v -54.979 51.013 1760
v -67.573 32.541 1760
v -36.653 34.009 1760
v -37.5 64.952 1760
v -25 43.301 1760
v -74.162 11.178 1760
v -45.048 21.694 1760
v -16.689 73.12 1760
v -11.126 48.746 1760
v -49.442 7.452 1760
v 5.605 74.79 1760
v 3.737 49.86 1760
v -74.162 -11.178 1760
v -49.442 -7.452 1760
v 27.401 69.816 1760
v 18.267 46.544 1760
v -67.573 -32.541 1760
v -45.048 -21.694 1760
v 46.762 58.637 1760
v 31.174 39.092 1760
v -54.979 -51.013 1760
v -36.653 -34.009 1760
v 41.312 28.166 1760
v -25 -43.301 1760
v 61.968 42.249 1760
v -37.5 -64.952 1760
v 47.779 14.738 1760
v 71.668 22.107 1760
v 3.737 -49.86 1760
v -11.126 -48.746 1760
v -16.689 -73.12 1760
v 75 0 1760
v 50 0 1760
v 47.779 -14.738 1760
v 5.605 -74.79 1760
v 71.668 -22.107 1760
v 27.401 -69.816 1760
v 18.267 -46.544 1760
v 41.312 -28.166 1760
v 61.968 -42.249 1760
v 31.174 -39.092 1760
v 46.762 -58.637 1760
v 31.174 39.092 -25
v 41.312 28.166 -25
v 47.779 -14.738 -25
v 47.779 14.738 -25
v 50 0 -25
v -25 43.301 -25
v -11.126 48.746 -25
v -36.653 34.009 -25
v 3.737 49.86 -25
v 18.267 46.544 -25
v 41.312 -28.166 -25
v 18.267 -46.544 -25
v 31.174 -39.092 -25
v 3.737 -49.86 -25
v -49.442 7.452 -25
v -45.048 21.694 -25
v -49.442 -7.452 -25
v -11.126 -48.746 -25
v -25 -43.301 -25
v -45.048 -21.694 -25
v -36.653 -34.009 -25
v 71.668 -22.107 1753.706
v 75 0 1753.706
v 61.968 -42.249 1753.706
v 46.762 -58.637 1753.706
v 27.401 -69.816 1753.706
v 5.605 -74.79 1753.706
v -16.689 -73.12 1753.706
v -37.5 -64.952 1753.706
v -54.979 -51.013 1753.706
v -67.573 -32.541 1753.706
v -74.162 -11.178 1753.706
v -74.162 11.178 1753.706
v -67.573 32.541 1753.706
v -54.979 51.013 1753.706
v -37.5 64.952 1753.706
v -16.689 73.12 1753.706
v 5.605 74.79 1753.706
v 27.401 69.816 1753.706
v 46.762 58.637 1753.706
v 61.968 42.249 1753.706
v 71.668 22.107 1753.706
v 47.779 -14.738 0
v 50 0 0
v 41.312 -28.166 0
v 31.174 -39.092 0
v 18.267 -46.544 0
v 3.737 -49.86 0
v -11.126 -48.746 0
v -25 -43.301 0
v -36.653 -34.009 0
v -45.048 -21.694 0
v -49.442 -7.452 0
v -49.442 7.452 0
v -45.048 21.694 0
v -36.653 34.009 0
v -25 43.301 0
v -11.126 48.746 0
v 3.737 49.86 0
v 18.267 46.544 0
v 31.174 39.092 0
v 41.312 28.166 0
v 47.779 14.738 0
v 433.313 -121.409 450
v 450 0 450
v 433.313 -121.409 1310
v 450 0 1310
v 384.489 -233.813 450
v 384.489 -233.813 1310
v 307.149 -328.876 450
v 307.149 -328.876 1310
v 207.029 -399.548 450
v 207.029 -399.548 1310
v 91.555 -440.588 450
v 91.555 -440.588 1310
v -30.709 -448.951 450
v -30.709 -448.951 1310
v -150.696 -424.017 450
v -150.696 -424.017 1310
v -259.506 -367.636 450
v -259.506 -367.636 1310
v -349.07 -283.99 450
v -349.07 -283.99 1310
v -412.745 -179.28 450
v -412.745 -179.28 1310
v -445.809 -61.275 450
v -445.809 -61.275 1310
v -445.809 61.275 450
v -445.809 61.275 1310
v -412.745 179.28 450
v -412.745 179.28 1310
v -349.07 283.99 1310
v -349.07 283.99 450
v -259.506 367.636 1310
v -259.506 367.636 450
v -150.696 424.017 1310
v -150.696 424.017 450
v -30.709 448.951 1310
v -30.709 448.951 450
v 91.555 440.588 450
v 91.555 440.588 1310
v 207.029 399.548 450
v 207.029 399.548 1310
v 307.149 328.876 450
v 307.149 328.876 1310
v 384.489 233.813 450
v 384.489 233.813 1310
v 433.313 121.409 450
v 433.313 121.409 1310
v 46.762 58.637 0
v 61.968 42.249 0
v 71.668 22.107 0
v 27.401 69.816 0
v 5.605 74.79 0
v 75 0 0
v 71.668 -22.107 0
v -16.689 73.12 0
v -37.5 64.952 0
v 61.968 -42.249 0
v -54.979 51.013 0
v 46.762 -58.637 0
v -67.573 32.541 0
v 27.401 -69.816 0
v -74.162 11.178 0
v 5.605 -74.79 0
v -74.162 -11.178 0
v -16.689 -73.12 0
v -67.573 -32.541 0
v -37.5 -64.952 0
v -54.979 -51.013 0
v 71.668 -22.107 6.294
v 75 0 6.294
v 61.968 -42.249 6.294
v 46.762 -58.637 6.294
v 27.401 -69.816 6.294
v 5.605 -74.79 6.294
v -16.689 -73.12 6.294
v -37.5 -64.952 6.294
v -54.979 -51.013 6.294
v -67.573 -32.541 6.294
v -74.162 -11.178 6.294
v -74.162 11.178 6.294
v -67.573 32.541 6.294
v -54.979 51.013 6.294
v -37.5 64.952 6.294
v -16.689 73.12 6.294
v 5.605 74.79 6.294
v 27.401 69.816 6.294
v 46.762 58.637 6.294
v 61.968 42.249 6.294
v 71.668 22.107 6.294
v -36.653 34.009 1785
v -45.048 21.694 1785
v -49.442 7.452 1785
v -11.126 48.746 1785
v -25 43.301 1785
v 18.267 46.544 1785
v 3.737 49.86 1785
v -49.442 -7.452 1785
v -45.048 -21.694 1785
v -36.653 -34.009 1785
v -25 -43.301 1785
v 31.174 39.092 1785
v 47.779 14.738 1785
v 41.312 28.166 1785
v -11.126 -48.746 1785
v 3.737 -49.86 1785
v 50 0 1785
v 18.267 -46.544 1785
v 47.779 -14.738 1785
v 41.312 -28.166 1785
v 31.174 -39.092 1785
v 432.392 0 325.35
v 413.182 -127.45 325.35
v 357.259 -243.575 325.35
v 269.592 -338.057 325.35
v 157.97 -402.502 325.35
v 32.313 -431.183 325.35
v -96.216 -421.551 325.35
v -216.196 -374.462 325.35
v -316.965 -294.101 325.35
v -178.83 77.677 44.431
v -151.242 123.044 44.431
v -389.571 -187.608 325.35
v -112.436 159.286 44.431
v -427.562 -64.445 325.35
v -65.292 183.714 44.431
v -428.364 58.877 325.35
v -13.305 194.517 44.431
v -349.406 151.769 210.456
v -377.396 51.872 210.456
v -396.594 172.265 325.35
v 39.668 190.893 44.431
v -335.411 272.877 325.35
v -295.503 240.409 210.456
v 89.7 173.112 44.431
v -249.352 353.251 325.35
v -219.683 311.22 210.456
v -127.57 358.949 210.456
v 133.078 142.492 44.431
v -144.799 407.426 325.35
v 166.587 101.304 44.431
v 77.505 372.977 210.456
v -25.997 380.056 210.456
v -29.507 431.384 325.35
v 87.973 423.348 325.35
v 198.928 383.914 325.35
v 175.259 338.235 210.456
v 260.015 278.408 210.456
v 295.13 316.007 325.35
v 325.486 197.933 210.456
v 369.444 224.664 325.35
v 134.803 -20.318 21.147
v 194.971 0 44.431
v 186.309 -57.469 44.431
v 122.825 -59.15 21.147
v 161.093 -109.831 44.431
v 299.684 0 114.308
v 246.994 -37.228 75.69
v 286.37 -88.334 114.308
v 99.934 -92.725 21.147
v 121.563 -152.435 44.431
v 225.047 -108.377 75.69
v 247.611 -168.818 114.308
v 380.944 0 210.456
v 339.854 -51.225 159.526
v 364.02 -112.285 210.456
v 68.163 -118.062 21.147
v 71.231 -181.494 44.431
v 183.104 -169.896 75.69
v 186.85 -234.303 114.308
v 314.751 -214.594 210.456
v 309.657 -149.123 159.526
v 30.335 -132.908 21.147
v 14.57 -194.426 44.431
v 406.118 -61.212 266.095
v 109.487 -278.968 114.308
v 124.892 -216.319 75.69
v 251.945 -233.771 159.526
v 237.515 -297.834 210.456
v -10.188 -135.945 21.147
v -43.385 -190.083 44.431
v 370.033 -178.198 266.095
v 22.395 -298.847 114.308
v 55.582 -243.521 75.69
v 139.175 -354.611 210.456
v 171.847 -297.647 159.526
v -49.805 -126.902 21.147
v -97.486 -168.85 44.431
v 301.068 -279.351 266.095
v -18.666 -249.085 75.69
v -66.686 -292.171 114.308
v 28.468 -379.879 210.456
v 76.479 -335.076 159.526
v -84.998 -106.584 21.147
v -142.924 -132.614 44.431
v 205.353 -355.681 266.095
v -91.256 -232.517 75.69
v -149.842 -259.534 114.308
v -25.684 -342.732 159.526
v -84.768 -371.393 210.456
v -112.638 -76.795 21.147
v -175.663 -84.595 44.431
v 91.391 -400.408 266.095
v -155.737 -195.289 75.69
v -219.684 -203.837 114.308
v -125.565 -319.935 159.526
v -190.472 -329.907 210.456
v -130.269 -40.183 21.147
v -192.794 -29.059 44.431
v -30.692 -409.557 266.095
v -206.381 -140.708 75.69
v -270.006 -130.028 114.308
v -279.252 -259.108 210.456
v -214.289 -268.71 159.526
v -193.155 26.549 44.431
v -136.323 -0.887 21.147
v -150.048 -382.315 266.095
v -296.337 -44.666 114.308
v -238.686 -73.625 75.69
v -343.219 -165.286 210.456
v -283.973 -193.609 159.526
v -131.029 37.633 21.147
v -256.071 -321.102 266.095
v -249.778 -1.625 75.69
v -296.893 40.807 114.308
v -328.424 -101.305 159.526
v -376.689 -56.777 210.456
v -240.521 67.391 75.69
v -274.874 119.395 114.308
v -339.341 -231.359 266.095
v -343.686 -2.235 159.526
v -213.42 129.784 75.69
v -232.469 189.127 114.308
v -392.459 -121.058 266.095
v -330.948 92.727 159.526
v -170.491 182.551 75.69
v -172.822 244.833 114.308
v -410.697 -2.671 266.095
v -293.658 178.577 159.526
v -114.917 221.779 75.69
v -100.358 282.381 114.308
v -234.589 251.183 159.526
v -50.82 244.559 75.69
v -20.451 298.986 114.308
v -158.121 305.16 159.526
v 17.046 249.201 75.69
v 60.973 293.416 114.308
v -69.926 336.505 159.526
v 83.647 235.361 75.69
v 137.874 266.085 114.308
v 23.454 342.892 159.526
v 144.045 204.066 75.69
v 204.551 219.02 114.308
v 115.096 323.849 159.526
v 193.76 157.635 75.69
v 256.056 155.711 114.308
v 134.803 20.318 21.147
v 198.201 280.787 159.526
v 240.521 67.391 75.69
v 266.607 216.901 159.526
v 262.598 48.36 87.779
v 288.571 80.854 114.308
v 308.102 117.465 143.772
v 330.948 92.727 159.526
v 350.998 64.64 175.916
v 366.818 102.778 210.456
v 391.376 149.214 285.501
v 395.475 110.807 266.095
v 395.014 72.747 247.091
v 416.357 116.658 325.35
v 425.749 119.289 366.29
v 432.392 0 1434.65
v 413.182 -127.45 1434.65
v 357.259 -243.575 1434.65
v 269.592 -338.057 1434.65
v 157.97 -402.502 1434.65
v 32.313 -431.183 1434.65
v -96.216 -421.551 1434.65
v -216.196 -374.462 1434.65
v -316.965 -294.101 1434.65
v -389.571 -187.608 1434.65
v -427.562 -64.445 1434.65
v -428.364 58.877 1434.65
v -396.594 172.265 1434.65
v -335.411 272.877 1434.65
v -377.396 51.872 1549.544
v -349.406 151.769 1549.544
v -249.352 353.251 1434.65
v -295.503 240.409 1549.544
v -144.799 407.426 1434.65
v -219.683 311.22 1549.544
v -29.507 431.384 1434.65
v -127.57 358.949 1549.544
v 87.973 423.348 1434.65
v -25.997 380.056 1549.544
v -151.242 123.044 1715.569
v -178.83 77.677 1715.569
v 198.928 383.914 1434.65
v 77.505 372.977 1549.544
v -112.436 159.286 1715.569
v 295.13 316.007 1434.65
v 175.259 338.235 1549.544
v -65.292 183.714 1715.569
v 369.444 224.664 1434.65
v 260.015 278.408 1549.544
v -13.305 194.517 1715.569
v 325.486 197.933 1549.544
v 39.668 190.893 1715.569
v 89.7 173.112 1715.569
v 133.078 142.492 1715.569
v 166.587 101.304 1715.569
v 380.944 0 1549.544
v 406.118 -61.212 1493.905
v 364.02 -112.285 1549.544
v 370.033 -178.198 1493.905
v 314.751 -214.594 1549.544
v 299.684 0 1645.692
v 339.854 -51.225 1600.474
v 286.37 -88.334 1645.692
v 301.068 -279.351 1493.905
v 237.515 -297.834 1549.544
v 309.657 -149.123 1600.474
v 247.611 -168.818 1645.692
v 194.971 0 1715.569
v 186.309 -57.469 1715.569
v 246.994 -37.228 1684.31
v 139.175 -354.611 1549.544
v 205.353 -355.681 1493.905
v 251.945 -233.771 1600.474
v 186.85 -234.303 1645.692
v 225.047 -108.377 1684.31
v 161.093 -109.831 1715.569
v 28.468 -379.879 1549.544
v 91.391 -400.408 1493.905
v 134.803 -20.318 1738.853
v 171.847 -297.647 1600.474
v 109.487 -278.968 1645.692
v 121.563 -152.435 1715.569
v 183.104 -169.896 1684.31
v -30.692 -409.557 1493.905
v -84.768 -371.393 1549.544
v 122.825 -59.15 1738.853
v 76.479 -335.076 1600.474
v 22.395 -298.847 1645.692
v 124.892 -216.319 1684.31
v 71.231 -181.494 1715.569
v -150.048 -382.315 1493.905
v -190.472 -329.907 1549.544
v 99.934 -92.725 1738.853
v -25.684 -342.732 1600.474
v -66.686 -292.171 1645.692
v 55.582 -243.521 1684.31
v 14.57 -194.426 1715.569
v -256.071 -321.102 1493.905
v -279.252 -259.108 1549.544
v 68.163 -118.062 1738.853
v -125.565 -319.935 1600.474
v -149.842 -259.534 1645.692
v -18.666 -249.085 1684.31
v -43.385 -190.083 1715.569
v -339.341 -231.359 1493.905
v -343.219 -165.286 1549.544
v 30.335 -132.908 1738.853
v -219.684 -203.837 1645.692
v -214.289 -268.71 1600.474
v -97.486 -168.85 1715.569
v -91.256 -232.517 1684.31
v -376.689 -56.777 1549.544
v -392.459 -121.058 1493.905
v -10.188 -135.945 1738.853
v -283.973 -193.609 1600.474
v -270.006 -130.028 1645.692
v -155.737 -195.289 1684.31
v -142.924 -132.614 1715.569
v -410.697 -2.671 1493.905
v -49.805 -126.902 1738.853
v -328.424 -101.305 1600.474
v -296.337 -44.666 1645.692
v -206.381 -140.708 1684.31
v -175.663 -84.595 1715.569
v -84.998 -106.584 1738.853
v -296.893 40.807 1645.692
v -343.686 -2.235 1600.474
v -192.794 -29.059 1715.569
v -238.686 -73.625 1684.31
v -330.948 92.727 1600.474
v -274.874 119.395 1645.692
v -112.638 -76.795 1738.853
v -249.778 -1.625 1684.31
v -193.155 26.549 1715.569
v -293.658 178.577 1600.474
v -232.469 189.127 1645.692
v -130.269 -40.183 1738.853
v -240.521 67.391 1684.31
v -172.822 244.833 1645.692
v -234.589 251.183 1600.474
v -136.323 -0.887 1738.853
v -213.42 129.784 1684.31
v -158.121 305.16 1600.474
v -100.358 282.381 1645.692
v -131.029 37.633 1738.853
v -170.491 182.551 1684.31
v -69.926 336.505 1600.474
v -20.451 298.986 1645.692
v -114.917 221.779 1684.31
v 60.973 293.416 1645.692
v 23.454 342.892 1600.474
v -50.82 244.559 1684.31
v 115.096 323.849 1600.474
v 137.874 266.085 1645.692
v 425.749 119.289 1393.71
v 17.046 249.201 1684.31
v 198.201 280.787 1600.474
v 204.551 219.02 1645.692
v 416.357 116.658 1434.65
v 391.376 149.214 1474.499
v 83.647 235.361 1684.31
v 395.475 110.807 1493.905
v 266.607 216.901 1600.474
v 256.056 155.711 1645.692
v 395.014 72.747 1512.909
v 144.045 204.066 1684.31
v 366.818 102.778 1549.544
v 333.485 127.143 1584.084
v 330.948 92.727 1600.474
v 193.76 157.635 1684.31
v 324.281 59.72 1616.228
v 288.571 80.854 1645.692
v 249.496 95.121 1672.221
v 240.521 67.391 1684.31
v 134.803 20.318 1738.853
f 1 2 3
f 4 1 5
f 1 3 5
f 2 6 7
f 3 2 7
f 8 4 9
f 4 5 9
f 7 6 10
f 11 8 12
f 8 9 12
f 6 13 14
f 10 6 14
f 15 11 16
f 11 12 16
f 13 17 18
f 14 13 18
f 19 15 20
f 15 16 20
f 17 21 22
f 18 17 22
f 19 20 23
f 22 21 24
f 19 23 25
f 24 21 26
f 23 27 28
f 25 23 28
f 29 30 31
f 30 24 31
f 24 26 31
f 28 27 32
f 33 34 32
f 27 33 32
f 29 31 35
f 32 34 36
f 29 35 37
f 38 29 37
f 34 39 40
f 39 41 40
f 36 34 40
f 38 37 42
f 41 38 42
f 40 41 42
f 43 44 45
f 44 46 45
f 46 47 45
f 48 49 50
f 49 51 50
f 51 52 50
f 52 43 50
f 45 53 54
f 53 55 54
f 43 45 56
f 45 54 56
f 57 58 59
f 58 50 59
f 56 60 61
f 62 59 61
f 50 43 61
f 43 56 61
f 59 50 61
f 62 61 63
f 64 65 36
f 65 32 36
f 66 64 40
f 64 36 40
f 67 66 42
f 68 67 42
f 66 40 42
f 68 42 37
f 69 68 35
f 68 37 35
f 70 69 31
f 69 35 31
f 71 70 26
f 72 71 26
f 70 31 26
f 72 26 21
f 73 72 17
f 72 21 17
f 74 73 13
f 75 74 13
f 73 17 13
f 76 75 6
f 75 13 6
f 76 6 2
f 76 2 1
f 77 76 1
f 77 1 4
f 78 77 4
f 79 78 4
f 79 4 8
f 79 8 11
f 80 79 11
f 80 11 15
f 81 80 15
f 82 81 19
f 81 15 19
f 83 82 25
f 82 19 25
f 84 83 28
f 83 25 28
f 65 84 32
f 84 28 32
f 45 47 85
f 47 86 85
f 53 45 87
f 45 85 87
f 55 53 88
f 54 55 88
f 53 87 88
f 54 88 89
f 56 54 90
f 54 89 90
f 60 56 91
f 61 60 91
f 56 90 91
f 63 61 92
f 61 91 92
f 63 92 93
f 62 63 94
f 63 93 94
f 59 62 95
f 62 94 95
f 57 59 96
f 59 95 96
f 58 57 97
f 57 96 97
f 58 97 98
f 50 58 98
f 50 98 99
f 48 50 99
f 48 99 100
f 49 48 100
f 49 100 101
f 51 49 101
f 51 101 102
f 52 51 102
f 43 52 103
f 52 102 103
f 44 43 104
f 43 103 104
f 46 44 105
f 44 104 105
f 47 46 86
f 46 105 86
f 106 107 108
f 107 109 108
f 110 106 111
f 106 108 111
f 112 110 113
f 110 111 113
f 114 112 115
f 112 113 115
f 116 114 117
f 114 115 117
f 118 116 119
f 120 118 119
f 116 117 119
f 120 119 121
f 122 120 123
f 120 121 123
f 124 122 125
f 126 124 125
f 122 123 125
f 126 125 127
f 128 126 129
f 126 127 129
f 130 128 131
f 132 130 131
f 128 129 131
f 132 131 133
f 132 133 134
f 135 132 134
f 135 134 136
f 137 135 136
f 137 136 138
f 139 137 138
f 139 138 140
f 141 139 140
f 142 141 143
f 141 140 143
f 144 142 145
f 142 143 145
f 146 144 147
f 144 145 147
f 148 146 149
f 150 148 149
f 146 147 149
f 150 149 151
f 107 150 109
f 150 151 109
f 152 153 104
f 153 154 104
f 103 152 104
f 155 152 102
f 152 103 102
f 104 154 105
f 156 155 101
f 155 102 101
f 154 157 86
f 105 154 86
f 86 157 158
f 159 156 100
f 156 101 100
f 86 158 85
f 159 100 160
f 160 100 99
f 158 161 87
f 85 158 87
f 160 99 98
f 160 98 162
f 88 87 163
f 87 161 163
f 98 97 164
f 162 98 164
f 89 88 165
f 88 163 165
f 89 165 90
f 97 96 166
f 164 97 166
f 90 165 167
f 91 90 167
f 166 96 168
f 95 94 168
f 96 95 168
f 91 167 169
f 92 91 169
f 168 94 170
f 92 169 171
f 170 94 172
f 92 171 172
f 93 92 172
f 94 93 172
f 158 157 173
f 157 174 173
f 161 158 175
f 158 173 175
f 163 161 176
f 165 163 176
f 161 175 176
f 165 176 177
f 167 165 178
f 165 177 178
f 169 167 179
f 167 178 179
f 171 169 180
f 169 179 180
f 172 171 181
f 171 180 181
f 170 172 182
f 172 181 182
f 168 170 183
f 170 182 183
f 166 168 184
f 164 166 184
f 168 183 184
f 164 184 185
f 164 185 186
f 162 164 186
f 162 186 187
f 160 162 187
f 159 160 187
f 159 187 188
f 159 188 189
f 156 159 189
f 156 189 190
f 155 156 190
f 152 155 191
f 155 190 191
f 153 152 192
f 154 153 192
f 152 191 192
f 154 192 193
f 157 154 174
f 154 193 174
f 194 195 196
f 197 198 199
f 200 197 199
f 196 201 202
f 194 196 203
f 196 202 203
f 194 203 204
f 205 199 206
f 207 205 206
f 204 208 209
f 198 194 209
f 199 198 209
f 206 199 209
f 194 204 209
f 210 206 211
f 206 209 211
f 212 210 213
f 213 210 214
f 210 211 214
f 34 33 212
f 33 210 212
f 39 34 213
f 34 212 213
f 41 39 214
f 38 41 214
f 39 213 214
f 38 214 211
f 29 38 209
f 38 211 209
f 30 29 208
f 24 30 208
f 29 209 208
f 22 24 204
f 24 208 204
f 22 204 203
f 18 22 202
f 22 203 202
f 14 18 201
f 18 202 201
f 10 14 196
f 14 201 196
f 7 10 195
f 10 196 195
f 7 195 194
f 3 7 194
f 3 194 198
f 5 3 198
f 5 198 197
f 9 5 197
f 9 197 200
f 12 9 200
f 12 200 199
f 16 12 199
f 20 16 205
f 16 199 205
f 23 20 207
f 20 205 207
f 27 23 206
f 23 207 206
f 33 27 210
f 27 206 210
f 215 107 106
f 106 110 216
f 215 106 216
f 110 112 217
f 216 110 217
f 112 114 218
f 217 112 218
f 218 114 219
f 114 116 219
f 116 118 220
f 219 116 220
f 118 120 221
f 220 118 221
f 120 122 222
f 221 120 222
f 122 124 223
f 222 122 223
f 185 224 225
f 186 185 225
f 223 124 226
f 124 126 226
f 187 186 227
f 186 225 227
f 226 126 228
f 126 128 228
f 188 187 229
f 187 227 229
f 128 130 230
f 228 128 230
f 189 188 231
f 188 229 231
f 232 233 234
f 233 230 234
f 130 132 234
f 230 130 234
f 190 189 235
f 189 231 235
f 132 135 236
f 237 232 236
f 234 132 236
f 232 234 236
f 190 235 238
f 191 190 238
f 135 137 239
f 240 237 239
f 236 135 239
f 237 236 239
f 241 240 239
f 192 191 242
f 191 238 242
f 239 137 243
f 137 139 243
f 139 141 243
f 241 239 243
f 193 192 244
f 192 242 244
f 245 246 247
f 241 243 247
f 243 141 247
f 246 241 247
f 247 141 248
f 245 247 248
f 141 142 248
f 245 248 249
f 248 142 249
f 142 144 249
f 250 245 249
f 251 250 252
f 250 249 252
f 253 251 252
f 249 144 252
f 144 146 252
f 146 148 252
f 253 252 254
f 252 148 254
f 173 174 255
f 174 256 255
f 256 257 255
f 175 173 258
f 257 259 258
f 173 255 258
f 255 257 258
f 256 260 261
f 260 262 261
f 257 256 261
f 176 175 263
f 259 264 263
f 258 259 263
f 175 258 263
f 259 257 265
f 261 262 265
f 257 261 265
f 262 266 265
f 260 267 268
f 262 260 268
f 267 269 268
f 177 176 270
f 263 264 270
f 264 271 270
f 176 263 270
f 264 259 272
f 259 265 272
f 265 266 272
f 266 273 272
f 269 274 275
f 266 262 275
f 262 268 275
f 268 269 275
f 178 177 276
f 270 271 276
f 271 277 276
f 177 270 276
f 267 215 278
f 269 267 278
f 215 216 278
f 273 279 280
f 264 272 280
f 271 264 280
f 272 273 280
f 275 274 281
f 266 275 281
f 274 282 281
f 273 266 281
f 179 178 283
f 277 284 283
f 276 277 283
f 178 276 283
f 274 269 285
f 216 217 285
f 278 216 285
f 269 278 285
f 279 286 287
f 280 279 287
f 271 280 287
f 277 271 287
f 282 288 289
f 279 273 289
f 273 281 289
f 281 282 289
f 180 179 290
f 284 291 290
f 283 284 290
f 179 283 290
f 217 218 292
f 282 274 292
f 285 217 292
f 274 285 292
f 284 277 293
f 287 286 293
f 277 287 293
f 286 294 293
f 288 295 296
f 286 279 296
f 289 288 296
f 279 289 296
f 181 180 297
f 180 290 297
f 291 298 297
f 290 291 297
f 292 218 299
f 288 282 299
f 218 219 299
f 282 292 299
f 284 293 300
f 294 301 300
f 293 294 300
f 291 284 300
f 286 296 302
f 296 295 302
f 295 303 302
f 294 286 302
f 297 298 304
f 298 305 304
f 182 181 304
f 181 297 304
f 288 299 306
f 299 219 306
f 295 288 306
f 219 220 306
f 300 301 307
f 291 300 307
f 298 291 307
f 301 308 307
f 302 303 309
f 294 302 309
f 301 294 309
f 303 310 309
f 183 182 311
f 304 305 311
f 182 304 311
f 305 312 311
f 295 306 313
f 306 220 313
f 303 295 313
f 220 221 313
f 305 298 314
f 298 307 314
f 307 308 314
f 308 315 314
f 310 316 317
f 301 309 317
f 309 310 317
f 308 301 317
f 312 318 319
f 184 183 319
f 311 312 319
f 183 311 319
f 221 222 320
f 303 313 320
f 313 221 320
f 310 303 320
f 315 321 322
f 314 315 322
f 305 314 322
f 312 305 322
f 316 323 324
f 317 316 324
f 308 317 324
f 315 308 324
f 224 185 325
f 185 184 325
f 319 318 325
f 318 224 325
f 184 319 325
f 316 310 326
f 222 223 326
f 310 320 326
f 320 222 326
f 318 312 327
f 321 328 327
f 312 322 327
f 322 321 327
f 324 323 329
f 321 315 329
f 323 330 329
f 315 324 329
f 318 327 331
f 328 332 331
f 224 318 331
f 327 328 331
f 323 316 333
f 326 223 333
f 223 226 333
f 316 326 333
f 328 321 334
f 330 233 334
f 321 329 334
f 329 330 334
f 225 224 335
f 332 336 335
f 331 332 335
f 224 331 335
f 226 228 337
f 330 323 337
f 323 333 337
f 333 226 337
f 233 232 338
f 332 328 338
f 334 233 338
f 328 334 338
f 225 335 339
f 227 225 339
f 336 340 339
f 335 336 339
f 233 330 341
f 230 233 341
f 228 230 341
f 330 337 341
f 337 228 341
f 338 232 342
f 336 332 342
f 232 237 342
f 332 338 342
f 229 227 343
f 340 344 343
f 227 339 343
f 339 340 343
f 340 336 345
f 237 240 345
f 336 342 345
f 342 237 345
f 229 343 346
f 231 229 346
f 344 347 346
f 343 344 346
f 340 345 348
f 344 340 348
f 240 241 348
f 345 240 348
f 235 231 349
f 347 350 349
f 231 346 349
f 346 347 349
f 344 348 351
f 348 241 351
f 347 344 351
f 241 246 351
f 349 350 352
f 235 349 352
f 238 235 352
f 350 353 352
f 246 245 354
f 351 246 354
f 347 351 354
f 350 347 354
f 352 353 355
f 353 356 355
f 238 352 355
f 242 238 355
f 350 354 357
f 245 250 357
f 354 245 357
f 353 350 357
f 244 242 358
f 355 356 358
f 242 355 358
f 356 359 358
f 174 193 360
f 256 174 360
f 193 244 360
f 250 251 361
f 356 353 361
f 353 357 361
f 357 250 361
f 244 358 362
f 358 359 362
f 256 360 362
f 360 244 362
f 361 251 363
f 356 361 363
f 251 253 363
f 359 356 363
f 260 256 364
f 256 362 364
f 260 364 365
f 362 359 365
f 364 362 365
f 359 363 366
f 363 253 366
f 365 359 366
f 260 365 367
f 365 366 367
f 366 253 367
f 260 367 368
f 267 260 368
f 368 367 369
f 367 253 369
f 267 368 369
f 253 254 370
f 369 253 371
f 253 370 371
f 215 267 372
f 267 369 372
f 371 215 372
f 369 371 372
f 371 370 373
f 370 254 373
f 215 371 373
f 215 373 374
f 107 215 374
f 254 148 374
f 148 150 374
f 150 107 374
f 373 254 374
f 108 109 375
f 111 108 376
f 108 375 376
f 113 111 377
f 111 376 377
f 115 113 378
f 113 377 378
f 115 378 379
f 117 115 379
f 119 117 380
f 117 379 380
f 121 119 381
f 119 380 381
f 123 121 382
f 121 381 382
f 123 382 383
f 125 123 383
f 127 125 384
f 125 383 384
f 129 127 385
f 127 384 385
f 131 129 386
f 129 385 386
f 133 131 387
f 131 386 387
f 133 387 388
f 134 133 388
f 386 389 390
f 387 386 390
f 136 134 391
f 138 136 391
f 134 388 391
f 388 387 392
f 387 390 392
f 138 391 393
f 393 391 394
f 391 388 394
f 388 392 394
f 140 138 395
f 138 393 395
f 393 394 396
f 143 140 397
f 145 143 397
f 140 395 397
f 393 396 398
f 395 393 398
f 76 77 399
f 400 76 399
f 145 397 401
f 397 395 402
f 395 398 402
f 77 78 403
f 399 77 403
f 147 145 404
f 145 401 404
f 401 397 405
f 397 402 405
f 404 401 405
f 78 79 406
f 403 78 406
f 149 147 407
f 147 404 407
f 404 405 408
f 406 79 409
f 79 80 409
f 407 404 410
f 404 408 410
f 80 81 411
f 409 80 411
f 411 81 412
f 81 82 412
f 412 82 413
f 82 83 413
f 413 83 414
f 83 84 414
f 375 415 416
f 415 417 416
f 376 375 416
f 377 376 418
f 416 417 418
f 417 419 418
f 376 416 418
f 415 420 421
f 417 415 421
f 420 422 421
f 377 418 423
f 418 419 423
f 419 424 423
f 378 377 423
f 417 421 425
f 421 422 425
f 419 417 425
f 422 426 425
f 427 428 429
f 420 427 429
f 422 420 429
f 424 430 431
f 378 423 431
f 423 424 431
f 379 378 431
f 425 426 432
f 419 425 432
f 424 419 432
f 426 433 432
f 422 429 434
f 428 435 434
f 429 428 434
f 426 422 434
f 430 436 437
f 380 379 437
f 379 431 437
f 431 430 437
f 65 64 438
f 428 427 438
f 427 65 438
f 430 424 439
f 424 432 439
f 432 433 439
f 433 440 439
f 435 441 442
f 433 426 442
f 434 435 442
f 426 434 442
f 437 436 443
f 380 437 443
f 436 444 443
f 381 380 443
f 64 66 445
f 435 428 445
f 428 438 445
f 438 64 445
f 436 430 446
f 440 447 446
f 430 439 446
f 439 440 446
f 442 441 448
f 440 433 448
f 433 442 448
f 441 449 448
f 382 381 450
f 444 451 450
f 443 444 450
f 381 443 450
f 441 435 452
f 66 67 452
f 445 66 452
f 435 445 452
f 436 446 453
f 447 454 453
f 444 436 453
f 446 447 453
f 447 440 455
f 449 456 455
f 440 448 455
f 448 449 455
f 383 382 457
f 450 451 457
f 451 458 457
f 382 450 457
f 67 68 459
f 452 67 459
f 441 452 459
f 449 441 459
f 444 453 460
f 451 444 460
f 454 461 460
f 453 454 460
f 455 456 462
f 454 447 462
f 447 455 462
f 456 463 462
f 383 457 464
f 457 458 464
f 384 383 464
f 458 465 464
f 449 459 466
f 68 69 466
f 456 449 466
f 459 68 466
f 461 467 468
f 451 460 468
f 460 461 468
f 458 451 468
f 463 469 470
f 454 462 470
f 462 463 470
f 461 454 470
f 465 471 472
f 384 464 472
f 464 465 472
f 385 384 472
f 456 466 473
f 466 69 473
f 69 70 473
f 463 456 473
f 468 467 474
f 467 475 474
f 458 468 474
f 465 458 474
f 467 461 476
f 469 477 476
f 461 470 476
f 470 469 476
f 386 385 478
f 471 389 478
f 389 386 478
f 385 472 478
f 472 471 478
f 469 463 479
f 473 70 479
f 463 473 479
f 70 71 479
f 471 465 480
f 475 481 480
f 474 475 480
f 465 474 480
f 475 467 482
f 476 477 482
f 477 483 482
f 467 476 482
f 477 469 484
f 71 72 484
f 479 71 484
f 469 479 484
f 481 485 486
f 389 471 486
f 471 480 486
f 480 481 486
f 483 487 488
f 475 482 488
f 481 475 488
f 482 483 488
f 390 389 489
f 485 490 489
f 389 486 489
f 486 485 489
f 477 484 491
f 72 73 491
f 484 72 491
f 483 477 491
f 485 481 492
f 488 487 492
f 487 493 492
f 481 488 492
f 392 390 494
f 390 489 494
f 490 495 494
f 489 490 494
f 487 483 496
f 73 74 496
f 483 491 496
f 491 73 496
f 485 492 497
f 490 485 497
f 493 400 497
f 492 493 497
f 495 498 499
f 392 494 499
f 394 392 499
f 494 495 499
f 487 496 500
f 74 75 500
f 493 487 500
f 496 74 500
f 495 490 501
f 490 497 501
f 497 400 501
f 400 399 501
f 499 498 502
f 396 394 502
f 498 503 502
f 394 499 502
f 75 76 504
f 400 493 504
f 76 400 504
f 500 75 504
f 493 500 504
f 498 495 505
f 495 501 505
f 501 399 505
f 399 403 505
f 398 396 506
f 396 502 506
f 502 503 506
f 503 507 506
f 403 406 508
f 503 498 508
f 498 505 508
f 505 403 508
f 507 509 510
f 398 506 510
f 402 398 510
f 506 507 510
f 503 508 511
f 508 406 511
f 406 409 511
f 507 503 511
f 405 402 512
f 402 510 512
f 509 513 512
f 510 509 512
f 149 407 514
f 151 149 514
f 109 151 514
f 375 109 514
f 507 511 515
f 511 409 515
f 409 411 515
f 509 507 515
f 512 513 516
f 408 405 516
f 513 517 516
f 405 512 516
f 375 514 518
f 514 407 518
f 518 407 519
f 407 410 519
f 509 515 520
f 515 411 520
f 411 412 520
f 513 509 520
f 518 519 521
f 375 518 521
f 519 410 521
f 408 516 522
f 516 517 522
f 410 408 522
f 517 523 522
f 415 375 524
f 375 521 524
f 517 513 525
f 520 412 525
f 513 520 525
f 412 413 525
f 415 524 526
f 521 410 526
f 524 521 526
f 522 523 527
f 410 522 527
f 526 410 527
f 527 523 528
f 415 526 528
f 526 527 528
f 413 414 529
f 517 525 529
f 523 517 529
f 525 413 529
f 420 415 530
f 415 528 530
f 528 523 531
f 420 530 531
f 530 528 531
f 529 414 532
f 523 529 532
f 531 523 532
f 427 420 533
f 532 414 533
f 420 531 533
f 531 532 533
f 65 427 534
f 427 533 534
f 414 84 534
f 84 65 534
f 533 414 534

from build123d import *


with BuildPart() as f1:
    # F0 (on Front) → F1 (revolve)
    with BuildSketch(Plane.XZ):
        with BuildLine():
            Line((75, 0), (75, 6.294016))
            ThreePointArc((75, 6.294016), (343.693177, 159.526249), (450, 450))
            Line((450, 450), (450, 1310))
            ThreePointArc((450, 1310), (343.693177, 1600.473751), (75, 1753.705984))
            Line((75, 1753.705984), (75, 1760))
            Line((75, 1760), (50, 1760))
            Line((50, 1760), (50, 1785))
            Line((50, 1785), (0, 1785))
            Line((0, 1785), (0, 1760))
            Line((0, 1760), (0, 0))
            Line((0, 0), (0, -25))
            Line((0, -25), (50, -25))
            Line((50, -25), (50, 0))
            Line((50, 0), (75, 0))
        make_face()
    revolve(axis=Axis((0, 0, 880), (0, 0, -1)))


solid = f1.part
